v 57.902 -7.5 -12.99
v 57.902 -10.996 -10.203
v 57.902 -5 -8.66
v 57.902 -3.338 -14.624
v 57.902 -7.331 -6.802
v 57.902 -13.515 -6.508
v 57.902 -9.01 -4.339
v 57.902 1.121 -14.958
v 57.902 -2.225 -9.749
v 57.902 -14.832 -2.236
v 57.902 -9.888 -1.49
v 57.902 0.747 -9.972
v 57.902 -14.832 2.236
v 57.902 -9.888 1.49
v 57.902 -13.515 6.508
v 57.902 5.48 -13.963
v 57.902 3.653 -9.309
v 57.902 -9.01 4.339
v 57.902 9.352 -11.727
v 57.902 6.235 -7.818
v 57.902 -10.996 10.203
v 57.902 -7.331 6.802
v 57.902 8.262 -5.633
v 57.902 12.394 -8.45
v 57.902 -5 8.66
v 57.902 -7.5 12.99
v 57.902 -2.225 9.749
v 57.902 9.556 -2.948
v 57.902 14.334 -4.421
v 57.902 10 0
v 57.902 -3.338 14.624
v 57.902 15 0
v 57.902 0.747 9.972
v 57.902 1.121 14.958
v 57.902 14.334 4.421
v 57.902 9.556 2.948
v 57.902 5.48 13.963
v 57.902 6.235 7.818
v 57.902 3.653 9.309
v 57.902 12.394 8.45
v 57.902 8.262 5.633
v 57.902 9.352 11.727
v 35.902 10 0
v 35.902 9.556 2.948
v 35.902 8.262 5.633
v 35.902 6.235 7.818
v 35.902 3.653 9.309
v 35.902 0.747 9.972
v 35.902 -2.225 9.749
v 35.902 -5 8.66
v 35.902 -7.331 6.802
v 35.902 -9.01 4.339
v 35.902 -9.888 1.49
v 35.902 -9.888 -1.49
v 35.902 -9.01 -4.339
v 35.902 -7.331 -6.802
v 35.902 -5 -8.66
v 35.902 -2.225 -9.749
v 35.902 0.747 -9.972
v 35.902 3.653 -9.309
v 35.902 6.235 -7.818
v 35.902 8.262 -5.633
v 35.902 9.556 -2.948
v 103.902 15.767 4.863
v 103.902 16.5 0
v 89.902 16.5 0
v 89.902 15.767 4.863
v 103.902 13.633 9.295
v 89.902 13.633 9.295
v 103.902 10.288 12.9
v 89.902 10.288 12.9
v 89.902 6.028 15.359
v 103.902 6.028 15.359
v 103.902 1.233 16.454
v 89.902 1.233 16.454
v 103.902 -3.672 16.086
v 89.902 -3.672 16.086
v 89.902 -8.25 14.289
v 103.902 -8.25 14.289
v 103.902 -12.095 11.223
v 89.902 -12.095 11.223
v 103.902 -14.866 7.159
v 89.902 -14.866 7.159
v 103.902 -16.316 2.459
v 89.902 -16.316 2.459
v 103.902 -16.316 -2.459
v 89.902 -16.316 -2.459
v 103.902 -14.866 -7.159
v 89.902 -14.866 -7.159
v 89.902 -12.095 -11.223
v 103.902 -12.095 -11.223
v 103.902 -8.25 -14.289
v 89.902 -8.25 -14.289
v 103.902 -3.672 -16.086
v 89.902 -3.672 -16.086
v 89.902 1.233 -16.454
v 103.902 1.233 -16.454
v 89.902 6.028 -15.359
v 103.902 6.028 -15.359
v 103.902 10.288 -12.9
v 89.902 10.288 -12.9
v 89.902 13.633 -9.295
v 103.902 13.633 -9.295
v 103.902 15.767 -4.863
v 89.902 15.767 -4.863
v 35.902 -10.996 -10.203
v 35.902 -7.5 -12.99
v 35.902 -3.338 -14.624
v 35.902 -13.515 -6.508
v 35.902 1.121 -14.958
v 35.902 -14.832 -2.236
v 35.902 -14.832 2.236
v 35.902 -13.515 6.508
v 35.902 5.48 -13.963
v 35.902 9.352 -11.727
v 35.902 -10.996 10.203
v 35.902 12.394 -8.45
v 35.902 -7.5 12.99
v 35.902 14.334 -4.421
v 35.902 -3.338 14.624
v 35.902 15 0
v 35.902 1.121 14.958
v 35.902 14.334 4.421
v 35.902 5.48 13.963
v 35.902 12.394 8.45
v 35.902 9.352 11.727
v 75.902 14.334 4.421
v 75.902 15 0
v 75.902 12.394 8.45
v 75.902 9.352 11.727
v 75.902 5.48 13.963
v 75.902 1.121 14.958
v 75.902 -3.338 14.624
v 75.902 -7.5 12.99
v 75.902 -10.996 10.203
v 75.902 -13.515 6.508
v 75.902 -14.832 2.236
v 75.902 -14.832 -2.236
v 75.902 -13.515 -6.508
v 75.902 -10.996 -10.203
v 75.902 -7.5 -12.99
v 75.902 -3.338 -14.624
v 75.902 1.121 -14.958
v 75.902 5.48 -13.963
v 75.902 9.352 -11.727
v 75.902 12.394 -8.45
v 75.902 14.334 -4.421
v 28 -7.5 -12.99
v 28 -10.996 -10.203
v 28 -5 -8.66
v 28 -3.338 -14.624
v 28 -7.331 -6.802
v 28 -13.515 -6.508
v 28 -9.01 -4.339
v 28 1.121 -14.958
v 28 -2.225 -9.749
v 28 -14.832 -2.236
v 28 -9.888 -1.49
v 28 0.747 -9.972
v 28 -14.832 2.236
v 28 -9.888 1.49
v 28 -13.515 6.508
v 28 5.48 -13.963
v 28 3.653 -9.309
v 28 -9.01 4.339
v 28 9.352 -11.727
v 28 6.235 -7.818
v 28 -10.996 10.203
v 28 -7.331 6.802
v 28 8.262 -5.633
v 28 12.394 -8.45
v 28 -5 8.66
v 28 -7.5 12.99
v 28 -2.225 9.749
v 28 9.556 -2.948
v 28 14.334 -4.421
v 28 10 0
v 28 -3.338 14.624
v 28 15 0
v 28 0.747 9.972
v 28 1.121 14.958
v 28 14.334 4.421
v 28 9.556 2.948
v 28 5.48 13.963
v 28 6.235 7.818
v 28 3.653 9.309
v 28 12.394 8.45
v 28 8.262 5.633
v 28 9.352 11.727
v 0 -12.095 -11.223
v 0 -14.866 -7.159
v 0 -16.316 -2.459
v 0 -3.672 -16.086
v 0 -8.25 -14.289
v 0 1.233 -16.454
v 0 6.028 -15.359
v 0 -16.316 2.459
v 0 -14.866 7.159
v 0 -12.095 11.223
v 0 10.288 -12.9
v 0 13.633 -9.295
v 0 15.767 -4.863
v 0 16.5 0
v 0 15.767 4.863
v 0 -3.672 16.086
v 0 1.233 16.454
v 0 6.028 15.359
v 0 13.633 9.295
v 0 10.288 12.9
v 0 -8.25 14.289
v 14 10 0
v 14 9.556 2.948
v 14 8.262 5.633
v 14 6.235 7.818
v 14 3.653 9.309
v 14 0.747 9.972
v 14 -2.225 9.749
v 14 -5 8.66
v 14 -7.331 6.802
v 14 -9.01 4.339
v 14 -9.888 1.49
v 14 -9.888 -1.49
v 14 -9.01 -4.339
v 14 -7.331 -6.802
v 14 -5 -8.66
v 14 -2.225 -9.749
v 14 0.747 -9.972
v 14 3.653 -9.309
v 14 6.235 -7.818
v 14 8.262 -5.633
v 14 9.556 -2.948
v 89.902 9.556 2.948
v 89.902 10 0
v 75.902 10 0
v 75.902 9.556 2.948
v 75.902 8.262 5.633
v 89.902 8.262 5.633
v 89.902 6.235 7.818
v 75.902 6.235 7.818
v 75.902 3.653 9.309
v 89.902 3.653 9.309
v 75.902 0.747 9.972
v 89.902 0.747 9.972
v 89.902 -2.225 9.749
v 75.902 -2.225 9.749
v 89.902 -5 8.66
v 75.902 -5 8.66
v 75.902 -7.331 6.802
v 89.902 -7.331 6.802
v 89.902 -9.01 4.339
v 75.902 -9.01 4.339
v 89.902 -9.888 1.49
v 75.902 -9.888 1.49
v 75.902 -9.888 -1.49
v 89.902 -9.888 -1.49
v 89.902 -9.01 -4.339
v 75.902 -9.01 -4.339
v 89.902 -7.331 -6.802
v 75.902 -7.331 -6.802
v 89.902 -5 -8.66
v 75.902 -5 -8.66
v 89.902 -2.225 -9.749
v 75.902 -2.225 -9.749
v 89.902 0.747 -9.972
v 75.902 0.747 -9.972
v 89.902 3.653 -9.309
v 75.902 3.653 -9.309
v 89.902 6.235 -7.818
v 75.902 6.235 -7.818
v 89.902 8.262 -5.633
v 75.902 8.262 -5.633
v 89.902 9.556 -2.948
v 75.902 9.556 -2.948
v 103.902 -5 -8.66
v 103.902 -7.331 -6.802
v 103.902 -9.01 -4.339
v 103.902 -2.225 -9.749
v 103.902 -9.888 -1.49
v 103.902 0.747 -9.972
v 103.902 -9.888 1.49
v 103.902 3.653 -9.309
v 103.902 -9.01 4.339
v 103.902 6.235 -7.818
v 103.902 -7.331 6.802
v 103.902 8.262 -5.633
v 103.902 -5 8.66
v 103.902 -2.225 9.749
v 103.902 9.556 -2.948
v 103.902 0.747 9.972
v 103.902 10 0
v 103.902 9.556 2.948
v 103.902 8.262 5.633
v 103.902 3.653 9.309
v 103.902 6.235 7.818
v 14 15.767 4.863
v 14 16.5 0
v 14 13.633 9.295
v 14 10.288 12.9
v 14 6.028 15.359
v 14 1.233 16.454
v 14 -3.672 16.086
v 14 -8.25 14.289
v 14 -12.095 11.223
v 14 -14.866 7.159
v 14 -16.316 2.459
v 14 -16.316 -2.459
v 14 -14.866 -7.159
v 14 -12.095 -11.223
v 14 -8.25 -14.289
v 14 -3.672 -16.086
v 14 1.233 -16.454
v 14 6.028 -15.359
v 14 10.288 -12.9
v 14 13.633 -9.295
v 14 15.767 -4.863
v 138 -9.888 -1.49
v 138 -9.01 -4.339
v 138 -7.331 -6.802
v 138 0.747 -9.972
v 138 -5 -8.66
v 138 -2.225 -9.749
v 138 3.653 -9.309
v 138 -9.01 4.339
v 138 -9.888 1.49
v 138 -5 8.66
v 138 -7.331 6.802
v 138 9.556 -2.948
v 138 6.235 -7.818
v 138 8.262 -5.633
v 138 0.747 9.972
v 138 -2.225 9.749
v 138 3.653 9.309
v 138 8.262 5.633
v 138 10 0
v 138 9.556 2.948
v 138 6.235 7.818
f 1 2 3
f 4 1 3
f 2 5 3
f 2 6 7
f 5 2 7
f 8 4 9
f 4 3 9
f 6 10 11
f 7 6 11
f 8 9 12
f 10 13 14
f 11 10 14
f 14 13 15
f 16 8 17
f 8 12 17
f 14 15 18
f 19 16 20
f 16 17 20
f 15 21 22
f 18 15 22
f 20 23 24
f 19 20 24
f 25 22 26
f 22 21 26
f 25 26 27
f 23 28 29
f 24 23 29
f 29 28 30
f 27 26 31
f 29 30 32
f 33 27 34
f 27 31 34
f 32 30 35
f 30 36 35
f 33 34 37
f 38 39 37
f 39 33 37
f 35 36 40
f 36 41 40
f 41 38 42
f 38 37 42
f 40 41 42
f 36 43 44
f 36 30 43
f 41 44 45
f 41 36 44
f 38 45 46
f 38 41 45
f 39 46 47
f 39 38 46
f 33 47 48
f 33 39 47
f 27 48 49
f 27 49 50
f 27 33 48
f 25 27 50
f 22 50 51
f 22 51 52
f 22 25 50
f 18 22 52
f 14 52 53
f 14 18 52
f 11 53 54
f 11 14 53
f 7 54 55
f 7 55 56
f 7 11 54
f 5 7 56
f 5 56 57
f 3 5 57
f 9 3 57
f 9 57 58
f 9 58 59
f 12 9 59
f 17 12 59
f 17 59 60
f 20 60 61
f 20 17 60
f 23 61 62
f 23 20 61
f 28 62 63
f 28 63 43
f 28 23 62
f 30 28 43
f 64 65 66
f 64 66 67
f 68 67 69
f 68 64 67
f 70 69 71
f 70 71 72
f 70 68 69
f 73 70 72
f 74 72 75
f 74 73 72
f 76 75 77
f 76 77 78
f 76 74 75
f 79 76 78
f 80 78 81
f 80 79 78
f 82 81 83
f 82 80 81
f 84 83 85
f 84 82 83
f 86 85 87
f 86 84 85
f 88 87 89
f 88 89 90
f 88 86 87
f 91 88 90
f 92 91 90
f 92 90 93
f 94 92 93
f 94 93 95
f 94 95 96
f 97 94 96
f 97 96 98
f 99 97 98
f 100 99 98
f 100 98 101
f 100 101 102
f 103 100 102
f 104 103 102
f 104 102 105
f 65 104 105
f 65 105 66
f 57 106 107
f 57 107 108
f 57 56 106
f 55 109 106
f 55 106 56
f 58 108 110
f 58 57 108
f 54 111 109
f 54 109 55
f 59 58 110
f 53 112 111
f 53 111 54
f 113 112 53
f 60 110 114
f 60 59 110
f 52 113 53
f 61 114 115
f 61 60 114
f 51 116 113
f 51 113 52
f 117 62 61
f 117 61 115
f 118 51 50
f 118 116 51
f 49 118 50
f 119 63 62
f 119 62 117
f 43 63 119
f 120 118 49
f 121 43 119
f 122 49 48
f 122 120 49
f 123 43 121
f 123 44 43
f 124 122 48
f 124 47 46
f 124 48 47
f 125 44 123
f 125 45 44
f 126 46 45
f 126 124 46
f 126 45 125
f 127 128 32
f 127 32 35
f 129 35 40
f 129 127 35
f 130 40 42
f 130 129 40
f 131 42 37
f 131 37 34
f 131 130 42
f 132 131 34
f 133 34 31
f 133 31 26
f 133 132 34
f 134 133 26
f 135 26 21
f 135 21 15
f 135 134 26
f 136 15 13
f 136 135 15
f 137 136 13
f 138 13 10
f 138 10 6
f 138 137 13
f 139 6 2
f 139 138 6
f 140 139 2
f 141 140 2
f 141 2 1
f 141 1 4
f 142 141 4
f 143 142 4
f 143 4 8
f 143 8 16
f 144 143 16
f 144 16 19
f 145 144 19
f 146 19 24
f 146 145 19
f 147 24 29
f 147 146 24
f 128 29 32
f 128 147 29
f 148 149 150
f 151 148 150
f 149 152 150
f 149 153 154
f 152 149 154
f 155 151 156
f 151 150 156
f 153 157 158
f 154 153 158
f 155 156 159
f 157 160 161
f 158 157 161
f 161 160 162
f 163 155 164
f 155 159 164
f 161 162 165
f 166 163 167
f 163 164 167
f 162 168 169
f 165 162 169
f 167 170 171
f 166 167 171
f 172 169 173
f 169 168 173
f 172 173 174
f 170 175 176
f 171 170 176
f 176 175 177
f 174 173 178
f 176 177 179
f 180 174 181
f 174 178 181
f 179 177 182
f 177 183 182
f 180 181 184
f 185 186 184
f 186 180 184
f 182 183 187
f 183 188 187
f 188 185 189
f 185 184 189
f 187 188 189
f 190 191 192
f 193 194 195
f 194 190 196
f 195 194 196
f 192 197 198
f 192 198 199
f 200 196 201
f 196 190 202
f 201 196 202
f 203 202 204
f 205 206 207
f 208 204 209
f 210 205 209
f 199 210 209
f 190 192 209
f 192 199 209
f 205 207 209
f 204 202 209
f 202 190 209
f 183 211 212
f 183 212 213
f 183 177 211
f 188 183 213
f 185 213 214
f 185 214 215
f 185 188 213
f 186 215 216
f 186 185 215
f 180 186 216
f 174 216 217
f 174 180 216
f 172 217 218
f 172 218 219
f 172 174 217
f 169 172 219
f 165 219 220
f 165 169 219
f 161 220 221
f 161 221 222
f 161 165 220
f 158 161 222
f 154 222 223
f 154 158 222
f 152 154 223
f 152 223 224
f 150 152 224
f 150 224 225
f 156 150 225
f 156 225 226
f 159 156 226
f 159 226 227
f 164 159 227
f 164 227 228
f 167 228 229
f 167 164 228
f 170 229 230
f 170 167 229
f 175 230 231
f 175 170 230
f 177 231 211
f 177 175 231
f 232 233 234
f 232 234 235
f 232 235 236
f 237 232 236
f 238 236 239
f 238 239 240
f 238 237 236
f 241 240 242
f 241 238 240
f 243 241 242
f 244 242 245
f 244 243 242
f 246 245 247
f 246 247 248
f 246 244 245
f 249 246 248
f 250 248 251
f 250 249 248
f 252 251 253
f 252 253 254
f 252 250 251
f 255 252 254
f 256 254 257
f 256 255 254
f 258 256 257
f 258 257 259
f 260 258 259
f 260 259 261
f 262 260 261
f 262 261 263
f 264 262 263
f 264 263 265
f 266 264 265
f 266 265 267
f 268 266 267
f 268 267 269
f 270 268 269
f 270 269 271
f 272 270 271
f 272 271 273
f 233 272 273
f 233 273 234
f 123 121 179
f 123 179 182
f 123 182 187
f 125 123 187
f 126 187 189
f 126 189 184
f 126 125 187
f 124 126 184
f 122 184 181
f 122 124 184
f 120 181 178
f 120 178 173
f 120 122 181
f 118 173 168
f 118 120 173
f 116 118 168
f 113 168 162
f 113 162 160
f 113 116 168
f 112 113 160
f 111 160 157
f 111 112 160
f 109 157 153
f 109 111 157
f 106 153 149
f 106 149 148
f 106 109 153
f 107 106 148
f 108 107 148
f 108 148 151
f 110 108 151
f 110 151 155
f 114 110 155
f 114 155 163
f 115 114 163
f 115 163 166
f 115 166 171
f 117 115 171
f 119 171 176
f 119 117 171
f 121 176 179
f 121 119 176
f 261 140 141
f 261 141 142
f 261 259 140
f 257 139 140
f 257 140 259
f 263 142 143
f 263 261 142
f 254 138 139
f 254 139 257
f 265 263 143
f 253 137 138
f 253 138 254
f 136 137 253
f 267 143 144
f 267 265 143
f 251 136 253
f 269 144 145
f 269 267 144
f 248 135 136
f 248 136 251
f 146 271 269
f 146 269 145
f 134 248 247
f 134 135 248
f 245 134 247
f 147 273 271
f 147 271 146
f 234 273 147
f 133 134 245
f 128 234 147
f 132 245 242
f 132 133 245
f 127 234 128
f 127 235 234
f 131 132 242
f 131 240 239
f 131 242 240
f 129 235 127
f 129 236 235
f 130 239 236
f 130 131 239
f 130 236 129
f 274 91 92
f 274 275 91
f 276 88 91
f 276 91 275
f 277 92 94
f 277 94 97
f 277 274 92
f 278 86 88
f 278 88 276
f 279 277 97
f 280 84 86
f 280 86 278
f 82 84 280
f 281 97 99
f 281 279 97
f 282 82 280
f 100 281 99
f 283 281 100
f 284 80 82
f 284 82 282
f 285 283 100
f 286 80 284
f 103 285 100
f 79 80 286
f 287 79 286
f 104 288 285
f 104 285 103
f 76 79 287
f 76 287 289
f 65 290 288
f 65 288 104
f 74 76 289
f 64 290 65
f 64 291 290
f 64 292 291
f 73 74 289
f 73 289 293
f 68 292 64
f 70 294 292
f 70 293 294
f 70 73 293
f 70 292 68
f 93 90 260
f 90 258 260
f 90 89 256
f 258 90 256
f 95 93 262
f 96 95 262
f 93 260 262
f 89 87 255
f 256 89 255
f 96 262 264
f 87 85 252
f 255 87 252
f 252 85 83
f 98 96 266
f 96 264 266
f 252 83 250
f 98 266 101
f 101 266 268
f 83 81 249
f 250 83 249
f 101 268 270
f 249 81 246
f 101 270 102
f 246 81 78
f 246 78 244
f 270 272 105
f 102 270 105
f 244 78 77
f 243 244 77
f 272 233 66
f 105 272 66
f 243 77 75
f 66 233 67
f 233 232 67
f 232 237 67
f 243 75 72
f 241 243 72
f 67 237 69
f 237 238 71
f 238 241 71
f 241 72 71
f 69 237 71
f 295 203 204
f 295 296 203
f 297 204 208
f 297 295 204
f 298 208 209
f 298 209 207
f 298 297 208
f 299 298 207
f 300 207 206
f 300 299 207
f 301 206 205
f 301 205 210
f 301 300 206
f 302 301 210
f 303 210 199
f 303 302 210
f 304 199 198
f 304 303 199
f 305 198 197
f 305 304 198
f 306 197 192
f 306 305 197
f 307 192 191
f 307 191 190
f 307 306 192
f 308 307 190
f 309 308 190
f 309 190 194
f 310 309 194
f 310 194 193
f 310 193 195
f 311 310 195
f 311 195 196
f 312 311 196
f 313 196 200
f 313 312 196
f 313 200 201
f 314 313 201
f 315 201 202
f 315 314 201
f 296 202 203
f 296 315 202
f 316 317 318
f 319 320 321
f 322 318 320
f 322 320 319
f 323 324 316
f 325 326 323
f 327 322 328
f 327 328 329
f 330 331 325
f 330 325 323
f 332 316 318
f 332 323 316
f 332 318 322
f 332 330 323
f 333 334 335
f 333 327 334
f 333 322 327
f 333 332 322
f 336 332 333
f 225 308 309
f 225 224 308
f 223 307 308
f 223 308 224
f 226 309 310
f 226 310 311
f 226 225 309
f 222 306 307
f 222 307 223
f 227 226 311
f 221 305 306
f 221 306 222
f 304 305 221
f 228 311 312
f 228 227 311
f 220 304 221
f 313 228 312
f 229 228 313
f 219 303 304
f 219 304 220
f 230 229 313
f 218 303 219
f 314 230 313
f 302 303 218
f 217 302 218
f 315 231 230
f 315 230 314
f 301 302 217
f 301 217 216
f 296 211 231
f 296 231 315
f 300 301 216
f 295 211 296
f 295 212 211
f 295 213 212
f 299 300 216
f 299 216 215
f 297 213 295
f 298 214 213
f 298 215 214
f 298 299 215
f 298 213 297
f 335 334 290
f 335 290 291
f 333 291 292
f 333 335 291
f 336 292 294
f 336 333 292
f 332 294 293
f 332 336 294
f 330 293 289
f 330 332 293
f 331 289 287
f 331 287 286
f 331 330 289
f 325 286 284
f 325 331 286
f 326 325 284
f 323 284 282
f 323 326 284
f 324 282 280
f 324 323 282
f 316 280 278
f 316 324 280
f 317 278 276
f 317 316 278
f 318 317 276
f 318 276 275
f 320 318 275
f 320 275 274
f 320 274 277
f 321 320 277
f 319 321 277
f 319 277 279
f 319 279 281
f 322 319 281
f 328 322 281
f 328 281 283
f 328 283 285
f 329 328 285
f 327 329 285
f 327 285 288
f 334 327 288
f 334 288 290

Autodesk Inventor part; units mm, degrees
ref_plane "YZ Plane" through (0, 0, 0) normal (1, 0, 0) x (0, 1, 0)
ref_plane "XZ Plane" through (0, 0, 0) normal (0, 1, 0) x (-1, 0, 0)
ref_plane "XY Plane" through (0, 0, 0) normal (0, 0, 1) x (1, 0, 0)
sketch "Skizze1" plane through (0, 0, 0) normal (0, 0, 1) x (1, 0, 0)
  line L0 (0, 0) -> (138, 0)
  line L1 (0, 0) -> (0, 16.5)
  line L2 (0, 16.5) -> (14, 16.5)
  line L3 (14, 16.5) -> (14, 10)
  line L4 (14, 10) -> (28, 10)
  line L5 (28, 10) -> (28, 15)
  line L6 (28, 15) -> (35.9017, 15)
  line L7 (35.9017, 15) -> (35.9017, 10)
  line L8 (35.9017, 10) -> (57.9017, 10)
  line L9 (57.9017, 10) -> (57.9017, 15)
  line L10 (57.9017, 15) -> (75.9017, 15)
  line L11 (75.9017, 15) -> (75.9017, 10)
  line L12 (75.9017, 10) -> (89.9017, 10)
  line L13 (89.9017, 10) -> (89.9017, 16.5)
  line L14 (89.9017, 16.5) -> (103.9017, 16.5)
  line L15 (103.9017, 16.5) -> (103.9017, 10)
  line L16 (103.9017, 10) -> (138, 10)
  line L17 (138, 10) -> (138, 0)
  point P0 (28, 12.5)
  point P1 (103.9017, 13.25)
  point P2 (89.9017, 13.25)
  dimension "d0" = 138
  dimension "d1" = 14
  dimension "d2" = 14
  dimension "d3" = 7.9017
  dimension "d4" = 22
  dimension "d5" = 14
  dimension "d6" = 14
  dimension "d7" = 18
  dimension "d8" = 33
  dimension "d9" = 20
  dimension "d10" = 30
revolve "Umdrehung1" add sketch "Skizze1" angle 360 about axis through (0, 0, 0) along (1, 0, 0)
properties part number "lehrerfreund" material "Stahl, galvanisiert"
